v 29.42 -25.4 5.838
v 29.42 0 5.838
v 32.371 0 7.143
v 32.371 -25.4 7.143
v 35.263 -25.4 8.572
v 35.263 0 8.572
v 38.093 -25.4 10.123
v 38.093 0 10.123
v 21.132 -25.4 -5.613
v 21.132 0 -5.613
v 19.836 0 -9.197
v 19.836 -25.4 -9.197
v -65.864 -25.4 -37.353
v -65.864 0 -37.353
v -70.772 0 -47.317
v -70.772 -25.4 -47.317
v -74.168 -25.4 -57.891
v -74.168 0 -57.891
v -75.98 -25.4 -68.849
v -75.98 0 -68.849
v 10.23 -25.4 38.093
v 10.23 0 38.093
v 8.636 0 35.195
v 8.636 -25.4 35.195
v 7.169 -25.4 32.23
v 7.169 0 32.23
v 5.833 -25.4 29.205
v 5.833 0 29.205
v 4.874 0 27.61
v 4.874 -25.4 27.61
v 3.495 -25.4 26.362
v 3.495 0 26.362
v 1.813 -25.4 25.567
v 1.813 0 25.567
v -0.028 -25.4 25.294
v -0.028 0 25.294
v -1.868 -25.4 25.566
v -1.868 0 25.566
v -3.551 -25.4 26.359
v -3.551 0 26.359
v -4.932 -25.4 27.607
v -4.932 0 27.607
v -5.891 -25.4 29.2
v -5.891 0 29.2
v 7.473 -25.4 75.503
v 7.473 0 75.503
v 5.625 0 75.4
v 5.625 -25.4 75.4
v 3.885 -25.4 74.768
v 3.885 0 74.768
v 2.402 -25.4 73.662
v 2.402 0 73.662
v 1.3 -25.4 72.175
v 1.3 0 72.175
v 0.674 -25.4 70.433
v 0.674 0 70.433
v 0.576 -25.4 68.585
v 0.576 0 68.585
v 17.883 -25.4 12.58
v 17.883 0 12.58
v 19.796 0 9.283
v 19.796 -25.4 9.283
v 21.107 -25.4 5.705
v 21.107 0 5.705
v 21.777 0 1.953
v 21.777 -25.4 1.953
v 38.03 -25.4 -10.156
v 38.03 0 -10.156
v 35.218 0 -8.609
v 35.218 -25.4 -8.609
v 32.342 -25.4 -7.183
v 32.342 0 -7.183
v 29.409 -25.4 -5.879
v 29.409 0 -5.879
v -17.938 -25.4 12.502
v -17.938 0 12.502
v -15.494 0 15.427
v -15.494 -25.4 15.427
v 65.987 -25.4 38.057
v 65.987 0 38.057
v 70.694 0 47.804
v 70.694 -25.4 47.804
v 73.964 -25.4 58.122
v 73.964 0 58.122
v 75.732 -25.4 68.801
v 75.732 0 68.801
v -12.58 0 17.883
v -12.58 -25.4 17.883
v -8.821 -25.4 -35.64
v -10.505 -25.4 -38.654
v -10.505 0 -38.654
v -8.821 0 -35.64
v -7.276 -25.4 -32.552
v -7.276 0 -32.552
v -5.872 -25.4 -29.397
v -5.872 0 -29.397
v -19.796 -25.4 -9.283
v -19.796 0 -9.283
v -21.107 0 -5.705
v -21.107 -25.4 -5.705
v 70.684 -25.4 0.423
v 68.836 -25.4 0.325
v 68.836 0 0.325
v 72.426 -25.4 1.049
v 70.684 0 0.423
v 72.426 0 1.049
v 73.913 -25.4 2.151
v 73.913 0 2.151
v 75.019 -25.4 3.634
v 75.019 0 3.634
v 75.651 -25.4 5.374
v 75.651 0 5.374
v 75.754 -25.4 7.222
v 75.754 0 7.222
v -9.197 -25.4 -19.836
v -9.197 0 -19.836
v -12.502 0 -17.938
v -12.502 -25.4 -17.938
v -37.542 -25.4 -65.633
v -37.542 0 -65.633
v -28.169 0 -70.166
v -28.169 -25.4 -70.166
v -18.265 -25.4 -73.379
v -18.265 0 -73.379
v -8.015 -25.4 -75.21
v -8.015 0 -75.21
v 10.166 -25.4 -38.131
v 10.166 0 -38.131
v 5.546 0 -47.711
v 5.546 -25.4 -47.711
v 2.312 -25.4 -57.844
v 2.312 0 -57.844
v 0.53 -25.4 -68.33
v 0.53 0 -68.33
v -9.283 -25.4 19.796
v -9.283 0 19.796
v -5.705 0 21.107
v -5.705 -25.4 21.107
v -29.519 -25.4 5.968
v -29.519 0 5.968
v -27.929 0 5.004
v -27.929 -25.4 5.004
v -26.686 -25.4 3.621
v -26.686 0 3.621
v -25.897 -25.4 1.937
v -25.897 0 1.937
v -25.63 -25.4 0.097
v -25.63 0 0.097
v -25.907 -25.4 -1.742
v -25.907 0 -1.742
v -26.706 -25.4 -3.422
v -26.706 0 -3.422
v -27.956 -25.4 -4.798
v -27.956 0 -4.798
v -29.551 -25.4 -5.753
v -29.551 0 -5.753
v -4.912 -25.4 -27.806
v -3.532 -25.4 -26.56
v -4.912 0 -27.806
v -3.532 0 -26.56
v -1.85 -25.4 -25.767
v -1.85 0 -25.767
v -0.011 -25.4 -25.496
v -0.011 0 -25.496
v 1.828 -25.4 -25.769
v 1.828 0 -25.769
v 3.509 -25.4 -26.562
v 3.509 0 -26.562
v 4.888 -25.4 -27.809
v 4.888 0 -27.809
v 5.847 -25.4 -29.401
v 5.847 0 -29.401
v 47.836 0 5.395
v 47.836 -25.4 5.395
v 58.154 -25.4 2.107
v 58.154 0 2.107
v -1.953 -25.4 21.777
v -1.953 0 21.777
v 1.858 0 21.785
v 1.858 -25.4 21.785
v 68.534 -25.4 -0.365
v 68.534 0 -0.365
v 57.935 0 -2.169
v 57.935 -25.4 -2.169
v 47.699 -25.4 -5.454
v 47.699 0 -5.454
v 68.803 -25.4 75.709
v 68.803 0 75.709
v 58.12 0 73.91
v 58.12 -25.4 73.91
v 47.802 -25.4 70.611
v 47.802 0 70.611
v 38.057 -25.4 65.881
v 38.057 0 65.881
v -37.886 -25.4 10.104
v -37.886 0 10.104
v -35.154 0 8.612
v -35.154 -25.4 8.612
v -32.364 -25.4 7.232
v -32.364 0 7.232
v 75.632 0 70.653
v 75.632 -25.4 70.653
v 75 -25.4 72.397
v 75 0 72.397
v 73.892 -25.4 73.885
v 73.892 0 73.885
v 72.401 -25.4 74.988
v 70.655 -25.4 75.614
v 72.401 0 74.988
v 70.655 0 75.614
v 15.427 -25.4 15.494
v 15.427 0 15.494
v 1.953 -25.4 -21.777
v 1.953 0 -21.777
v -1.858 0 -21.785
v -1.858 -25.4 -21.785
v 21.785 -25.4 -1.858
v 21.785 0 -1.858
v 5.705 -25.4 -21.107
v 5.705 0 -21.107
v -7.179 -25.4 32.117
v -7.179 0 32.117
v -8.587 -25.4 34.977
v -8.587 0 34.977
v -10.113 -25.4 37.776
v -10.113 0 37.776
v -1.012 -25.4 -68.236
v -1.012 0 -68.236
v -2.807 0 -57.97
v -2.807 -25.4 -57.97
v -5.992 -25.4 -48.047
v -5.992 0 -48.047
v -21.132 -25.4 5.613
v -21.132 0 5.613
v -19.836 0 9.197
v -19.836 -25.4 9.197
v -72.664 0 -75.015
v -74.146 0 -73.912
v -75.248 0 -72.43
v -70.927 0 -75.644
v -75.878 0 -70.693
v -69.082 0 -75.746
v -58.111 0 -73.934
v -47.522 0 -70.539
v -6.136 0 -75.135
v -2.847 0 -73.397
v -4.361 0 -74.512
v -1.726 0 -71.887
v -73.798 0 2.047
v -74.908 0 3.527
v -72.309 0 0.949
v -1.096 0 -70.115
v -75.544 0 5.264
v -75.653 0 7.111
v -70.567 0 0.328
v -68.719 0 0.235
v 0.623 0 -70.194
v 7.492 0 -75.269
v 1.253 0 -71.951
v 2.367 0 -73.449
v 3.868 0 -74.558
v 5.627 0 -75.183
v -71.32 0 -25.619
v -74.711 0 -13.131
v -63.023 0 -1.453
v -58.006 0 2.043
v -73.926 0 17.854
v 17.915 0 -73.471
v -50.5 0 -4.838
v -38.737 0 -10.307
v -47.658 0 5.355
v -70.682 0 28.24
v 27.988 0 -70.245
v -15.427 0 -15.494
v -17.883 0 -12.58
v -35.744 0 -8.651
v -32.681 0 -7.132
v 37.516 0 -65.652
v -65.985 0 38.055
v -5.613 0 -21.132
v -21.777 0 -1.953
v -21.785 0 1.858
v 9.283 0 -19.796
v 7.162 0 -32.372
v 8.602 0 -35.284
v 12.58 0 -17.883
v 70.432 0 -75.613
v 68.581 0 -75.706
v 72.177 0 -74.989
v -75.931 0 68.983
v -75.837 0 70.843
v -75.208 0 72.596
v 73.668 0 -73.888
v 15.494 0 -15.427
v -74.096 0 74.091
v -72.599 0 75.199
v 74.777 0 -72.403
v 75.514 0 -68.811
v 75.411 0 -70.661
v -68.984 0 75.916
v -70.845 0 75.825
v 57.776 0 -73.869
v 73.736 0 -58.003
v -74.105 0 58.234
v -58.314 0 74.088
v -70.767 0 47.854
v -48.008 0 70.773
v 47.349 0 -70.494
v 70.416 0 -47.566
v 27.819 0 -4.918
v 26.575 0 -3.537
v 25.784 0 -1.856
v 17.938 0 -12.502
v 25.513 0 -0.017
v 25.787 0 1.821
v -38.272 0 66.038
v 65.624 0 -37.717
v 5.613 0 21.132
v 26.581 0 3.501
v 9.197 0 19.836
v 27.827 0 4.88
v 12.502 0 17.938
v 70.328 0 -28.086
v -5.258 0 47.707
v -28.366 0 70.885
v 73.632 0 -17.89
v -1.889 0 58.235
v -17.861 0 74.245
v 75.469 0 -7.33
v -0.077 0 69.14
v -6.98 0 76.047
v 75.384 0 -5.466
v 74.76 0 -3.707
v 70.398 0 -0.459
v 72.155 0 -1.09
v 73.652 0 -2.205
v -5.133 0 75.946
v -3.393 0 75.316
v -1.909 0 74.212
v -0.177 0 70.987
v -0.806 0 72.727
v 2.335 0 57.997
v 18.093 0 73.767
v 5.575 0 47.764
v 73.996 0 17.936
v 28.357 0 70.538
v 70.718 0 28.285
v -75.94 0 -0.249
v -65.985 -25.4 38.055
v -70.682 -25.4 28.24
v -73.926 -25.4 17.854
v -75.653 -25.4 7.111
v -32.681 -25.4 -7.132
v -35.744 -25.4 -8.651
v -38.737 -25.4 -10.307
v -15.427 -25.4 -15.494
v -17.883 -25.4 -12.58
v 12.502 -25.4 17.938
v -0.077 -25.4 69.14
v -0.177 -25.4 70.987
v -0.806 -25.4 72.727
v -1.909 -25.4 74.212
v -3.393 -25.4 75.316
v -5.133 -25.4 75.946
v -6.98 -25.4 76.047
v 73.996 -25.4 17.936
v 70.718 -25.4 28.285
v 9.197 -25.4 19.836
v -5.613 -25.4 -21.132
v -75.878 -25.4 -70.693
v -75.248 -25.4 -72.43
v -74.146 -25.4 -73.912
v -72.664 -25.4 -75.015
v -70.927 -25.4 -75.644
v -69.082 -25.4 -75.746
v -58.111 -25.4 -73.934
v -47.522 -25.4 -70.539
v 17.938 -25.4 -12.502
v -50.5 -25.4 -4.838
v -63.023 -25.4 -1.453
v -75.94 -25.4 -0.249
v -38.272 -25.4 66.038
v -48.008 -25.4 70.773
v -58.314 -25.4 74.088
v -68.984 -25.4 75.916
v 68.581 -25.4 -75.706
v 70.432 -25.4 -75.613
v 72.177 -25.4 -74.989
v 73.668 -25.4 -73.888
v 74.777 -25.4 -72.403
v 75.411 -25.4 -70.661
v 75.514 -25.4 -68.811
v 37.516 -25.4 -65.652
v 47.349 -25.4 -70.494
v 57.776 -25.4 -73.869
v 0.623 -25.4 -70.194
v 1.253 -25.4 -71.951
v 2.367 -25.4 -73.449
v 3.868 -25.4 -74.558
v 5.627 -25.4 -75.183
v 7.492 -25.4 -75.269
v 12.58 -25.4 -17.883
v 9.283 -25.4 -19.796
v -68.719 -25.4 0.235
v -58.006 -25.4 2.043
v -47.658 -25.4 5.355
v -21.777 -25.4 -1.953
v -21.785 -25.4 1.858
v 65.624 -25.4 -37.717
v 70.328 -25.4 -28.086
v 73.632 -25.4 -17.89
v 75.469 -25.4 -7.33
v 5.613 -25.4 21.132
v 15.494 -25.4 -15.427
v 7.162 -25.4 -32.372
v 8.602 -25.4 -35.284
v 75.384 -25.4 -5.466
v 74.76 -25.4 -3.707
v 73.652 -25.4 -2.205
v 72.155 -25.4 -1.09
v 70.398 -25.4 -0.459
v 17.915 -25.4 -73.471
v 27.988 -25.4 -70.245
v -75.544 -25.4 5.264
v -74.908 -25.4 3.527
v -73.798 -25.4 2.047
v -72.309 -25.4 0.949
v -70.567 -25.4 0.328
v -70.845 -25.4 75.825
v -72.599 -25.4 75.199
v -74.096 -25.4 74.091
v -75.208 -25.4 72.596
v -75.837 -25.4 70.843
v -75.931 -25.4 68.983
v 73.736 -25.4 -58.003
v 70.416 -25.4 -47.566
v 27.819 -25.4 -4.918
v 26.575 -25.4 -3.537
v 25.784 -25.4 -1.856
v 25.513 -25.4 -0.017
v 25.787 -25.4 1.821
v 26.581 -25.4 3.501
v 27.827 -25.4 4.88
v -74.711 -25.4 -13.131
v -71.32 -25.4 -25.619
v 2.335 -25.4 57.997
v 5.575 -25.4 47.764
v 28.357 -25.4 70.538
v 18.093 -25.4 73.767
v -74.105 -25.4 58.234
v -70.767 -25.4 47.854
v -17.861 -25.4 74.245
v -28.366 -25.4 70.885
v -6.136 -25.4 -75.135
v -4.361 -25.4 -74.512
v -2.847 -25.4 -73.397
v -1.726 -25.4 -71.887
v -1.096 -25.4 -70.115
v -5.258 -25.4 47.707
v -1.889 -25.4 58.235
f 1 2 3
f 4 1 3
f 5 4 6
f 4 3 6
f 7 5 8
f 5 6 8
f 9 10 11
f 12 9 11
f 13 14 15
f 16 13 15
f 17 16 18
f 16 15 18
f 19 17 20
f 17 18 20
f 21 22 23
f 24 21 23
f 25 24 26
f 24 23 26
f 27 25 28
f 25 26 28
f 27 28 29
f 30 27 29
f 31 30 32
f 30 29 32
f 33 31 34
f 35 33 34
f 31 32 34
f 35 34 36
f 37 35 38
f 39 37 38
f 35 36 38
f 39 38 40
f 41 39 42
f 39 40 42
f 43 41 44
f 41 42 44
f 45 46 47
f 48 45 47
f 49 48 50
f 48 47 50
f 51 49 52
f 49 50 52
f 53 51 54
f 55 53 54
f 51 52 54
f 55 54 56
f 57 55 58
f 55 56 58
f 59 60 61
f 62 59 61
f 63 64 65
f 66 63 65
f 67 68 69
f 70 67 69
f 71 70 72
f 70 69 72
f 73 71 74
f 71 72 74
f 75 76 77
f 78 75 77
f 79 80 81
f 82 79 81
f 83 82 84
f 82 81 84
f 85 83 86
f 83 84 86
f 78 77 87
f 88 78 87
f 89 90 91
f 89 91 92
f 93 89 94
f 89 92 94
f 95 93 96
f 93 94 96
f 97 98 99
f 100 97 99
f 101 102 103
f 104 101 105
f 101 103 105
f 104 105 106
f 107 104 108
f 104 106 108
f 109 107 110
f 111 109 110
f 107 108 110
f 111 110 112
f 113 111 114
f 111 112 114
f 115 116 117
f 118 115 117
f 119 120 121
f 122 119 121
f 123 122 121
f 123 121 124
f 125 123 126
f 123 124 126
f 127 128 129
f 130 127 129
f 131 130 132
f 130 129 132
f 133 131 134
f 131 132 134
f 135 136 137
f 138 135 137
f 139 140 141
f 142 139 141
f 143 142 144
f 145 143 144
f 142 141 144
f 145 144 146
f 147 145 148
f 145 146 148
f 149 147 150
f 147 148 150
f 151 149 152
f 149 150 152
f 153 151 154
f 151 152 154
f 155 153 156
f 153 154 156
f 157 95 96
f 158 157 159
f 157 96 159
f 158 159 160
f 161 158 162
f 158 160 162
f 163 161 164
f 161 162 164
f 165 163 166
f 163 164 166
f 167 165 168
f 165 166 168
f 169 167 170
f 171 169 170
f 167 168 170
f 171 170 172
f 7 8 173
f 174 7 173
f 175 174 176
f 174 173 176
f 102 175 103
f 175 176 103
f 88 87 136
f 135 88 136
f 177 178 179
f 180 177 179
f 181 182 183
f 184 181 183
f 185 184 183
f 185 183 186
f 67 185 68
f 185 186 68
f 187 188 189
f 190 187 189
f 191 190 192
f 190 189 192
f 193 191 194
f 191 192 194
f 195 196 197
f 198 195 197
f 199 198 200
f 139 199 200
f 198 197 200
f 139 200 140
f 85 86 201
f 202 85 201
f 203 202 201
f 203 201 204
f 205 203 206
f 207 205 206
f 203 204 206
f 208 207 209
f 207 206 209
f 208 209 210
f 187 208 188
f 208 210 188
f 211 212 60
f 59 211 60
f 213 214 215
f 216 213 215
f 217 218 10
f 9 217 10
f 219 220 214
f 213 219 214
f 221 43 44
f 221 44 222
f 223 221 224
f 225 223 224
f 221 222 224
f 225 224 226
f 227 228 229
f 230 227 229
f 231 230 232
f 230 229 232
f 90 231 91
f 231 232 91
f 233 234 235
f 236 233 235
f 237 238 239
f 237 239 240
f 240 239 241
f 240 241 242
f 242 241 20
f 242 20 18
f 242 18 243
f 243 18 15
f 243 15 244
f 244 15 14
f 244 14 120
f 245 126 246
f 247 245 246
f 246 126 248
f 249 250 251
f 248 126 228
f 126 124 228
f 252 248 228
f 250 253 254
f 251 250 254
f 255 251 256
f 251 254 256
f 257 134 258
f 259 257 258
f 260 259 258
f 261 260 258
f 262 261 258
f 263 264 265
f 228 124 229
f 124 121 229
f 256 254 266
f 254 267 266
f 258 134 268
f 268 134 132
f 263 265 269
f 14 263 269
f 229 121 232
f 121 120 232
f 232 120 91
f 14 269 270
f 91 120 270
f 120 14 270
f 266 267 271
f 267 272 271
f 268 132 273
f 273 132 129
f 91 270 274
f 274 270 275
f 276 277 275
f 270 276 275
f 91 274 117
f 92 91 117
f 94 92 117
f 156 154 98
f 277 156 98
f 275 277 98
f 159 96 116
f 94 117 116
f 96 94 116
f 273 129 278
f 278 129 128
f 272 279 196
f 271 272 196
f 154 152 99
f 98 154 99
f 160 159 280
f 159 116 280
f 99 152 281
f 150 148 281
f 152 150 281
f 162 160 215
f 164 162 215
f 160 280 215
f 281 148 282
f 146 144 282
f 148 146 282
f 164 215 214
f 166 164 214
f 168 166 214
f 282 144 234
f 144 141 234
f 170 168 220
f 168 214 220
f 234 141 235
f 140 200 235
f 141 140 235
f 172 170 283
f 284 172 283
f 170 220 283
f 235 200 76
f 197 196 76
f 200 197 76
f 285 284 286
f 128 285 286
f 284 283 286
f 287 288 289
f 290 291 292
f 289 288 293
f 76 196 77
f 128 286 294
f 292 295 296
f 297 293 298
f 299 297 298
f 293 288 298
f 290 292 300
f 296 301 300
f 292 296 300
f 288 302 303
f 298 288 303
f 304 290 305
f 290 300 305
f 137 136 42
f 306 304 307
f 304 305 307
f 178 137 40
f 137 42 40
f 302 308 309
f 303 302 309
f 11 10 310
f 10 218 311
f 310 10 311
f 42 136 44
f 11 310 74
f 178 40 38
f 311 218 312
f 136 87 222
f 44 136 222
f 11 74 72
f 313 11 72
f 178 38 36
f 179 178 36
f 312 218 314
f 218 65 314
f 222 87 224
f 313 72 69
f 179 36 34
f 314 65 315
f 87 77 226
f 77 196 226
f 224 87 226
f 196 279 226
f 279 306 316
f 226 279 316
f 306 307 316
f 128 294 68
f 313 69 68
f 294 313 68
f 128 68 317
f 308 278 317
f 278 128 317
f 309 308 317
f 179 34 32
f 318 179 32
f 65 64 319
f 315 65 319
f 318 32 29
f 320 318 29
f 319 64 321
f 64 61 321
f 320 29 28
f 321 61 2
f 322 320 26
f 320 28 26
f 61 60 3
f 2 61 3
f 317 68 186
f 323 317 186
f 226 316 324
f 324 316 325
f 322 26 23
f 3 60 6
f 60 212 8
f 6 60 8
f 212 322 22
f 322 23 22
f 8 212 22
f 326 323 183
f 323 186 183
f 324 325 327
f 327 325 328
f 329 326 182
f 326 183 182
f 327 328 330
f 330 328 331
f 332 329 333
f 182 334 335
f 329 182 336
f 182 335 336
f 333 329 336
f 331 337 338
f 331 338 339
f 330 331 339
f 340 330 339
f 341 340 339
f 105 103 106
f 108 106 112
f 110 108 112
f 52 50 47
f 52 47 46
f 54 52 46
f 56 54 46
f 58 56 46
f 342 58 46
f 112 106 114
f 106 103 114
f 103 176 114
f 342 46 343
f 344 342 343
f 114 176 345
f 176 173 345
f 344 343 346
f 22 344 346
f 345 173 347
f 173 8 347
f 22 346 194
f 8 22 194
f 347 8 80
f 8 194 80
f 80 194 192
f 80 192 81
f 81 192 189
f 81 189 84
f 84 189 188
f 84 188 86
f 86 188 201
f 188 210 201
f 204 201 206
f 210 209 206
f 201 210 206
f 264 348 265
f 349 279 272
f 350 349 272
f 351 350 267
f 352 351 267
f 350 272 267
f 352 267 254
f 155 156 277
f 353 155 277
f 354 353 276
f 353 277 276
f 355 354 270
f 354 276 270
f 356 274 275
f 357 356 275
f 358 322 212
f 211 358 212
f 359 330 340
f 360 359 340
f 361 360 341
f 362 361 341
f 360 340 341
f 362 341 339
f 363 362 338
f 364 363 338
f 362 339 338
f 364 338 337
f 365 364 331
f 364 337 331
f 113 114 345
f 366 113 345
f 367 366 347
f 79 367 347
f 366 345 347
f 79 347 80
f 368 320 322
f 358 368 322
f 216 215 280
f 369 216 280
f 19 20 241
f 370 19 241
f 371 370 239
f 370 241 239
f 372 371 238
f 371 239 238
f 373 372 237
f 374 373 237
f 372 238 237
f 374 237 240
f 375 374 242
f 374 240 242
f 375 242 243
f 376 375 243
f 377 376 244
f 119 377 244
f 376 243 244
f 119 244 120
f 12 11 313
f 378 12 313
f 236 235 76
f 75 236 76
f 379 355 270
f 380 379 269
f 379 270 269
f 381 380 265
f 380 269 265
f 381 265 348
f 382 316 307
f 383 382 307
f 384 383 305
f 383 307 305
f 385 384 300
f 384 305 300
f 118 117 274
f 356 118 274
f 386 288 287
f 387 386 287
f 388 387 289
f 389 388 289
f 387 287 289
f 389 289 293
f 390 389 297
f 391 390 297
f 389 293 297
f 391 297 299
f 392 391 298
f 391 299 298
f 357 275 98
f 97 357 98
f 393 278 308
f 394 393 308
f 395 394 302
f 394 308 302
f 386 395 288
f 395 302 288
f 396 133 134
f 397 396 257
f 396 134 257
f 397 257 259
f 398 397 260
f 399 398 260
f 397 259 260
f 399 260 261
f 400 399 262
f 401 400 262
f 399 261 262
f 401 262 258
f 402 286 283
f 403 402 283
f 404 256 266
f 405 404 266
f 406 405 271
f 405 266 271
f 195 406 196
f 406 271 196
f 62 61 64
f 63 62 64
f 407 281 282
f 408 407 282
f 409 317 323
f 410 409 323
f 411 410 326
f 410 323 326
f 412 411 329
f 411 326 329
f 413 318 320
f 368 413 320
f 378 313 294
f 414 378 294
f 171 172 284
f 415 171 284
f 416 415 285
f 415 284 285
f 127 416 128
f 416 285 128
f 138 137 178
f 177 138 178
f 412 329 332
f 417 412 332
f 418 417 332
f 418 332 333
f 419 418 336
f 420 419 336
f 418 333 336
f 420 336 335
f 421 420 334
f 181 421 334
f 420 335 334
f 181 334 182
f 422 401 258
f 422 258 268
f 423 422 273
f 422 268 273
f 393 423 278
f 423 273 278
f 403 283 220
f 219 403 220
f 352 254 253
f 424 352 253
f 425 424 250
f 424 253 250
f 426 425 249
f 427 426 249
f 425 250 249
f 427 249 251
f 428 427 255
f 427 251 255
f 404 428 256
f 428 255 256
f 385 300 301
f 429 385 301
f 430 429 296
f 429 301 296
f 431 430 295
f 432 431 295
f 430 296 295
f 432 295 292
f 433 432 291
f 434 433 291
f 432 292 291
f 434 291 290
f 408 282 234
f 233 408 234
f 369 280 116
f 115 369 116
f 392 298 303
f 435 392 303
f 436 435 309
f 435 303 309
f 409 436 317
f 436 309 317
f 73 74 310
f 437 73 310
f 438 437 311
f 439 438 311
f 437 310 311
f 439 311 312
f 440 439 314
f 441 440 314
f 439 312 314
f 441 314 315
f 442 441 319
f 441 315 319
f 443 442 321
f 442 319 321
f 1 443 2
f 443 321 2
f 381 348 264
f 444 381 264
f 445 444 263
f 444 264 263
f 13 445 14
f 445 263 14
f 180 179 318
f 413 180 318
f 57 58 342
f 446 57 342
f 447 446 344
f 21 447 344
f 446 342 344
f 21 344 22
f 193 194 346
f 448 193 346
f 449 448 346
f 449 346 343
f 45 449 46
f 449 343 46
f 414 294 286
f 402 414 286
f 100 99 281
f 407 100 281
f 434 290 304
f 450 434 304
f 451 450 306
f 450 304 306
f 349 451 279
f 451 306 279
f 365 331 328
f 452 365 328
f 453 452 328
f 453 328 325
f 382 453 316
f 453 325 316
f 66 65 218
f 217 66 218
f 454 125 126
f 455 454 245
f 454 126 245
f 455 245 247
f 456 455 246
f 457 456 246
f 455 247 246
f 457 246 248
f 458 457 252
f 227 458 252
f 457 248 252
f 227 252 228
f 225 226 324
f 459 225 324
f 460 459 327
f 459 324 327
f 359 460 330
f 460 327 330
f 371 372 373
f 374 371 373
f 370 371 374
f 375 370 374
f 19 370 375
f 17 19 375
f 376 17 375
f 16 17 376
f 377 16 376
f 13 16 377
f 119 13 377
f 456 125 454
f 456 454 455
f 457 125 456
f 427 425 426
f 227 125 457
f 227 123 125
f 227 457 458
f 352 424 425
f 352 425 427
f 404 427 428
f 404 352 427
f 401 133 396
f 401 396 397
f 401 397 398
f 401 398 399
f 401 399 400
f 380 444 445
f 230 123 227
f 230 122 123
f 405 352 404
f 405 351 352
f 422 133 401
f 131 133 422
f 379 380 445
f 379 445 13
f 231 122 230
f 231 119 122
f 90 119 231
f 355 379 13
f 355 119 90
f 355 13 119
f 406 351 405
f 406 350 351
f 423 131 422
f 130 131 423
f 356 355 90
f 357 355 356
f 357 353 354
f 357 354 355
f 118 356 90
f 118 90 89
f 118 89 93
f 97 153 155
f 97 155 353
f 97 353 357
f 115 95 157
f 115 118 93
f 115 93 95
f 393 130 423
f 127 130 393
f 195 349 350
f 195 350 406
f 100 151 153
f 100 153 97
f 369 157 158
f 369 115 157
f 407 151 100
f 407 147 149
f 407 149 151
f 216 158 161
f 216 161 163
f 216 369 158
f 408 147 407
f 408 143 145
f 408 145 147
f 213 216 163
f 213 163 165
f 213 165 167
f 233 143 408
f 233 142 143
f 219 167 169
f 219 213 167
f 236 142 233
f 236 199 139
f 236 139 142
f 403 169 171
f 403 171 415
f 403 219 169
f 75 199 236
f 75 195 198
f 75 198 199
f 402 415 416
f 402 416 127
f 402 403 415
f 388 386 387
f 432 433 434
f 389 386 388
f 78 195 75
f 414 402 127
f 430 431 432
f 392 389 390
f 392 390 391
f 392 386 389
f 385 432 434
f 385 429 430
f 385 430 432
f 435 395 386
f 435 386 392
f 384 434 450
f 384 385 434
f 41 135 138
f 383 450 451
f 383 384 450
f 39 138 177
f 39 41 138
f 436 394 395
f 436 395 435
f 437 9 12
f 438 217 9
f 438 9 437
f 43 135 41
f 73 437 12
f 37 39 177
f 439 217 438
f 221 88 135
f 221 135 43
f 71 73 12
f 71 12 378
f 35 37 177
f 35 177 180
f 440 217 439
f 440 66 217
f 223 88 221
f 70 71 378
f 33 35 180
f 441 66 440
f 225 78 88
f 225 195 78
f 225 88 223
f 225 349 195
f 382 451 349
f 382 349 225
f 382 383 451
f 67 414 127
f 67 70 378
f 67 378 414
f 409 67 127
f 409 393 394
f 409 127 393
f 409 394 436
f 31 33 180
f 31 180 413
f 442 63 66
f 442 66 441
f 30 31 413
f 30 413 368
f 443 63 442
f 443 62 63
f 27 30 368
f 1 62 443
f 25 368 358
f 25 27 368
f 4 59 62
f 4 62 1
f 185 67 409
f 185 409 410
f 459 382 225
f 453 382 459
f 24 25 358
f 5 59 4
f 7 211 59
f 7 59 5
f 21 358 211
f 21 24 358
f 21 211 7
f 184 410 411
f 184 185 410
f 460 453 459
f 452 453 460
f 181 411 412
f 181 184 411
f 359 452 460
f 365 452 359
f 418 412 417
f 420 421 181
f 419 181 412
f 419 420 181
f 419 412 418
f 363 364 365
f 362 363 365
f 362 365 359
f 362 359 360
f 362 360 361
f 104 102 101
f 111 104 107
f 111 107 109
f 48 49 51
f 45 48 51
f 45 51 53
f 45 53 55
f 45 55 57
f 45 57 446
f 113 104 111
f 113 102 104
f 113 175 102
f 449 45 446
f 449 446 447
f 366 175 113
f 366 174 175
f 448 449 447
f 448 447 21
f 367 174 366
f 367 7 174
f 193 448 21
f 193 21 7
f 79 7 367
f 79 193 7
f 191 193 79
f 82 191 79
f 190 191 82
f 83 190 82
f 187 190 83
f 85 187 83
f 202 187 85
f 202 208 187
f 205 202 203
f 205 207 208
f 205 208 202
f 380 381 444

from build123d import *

# Parameters (mm, degrees)
F1_DEPTH = 25.4


with BuildPart() as f1:
    # F0 (on Front) → F1 (new body)
    with BuildSketch(Plane.XZ):
        with BuildLine():
            ThreePointArc((-5.8723054883, -29.3974713107), (-0.0113045982, -25.4959433684), (5.8471949357, -29.4012263195))
            ThreePointArc((5.8471949357, -29.4012263195), (7.8665830511, -33.8356885101), (10.1664885318, -38.131362853))
            ThreePointArc((10.1664885318, -38.131362853), (22.2433688947, -22.2960530681), (38.0304113332, -10.1561450647))
            ThreePointArc((38.0304113332, -10.1561450647), (33.7877497726, -7.8805671775), (29.4089474828, -5.8794369107))
            ThreePointArc((29.4089474828, -5.8794369107), (25.5132673299, -0.0171496036), (29.4195896796, 5.8380516761))
            ThreePointArc((29.4195896796, 5.8380516761), (33.8245563846, 7.8420080033), (38.0926920423, 10.1229268184))
            ThreePointArc((38.0926920423, 10.1229268184), (22.3048159694, 22.2586636554), (10.2296361263, 38.0929041244))
            ThreePointArc((10.2296361263, 38.0929041244), (7.8862120567, 33.7206748888), (5.832770092, 29.2049910031))
            ThreePointArc((5.832770092, 29.2049910031), (-0.0278322356, 25.2936581115), (-5.8914533675, 29.2004639491))
            ThreePointArc((-5.8914533675, 29.2004639491), (-7.8681260767, 33.5542655176), (-10.1128070971, 37.7761407186))
            ThreePointArc((-10.1128070971, 37.7761407186), (-22.1909246105, 22.1248469042), (-37.8860679576, 10.1037655868))
            ThreePointArc((-37.8860679576, 10.1037655868), (-33.7659122536, 7.9077693057), (-29.519257568, 5.9676644959))
            ThreePointArc((-29.519257568, 5.9676644959), (-25.6301816612, 0.0965438971), (-29.5513078142, -5.7532200459))
            ThreePointArc((-29.5513078142, -5.7532200459), (-34.2211473212, -7.8745098641), (-38.736597903, -10.3071992315))
            ThreePointArc((-38.736597903, -10.3071992315), (-22.7195783494, -22.5870715801), (-10.5053141935, -38.6541787064))
            ThreePointArc((-10.5053141935, -38.6541787064), (-8.0309058523, -34.1048564095), (-5.8723054883, -29.3974713107))
        make_face()
        Polygon((15.4941124372, -15.4270198163), (12.5798481763, -17.8831731103), (9.2833515942, -19.7959552386), (5.7047850715, -21.1072472842), (1.9528815413, -21.7772063019), (-1.8583593065, -21.7854759259), (-5.613134847, -21.1318048879), (-9.1973581256, -19.8360546515), (-12.5021243317, -17.9375959321), (-15.4270198163, -15.4941124372), (-17.8831731103, -12.5798481763), (-19.7959552386, -9.2833515942), (-21.1072472842, -5.7047850715), (-21.7772063019, -1.9528815413), (-21.7854759259, 1.8583593065), (-21.1318048879, 5.613134847), (-19.8360546515, 9.1973581256), (-17.9375959321, 12.5021243317), (-15.4941124372, 15.4270198163), (-12.5798481763, 17.8831731103), (-9.2833515942, 19.7959552386), (-5.7047850715, 21.1072472842), (-1.9528815413, 21.7772063019), (1.8583593065, 21.7854759259), (5.613134847, 21.1318048879), (9.1973581256, 19.8360546515), (12.5021243317, 17.9375959321), (15.4270198163, 15.4941124372), (17.8831731103, 12.5798481763), (19.7959552386, 9.2833515942), (21.1072472842, 5.7047850715), (21.7772063019, 1.9528815413), (21.7854759259, -1.8583593065), (21.1318048879, -5.613134847), (19.8360546515, -9.1973581256), (17.9375959321, -12.5021243317), align=None, mode=Mode.SUBTRACT)
        with BuildLine():
            ThreePointArc((38.0304113332, -10.1561450647), (22.2433688947, -22.2960530681), (10.1664885318, -38.131362853))
            ThreePointArc((10.1664885318, -38.131362853), (22.0522532258, -53.6697738876), (37.5164127114, -65.6519853381))
            ThreePointArc((37.5164127114, -65.6519853381), (53.4213887804, -53.5472360443), (65.6235914885, -37.7169022421))
            ThreePointArc((65.6235914885, -37.7169022421), (53.6333778688, -22.1280221412), (38.0304113332, -10.1561450647))
        make_face()
        with BuildLine():
            ThreePointArc((37.5164127114, -65.6519853381), (22.0522532258, -53.6697738876), (10.1664885318, -38.131362853))
            ThreePointArc((10.1664885318, -38.131362853), (3.7508996959, -52.7209861968), (0.5304546679, -68.3301381035))
            ThreePointArc((0.5304546679, -68.3301381035), (2.3669091486, -73.4489662261), (7.4915009075, -75.2692754617))
            ThreePointArc((7.4915009075, -75.2692754617), (23.0077646864, -72.0335045543), (37.5164127114, -65.6519853381))
        make_face()
        with BuildLine():
            ThreePointArc((65.6235914885, -37.7169022421), (53.4213887804, -53.5472360443), (37.5164127114, -65.6519853381))
            ThreePointArc((37.5164127114, -65.6519853381), (52.5012422767, -72.3700363612), (68.5807077231, -75.7059196936))
            ThreePointArc((68.5807077231, -75.7059196936), (73.6678671005, -73.8876561642), (75.5140176195, -68.8105505857))
            ThreePointArc((75.5140176195, -68.8105505857), (72.2649671763, -52.7242023626), (65.6235914885, -37.7169022421))
        make_face()
        with BuildLine():
            ThreePointArc((68.5341561345, -0.3654146815), (52.7586923315, -3.6294921253), (38.0304113332, -10.1561450647))
            ThreePointArc((38.0304113332, -10.1561450647), (53.6333778688, -22.1280221412), (65.6235914885, -37.7169022421))
            ThreePointArc((65.6235914885, -37.7169022421), (72.1596460359, -23.0463732384), (75.4693013087, -7.3304382592))
            ThreePointArc((75.4693013087, -7.3304382592), (73.6519305037, -2.2048036873), (68.5341561345, -0.3654146815))
        make_face()
        with BuildLine():
            ThreePointArc((-1.0124612587, -68.2357638288), (-4.2291126973, -52.9540601379), (-10.5053141935, -38.6541787064))
            ThreePointArc((-10.5053141935, -38.6541787064), (-22.2999024948, -53.8714051532), (-37.5422616312, -65.6334960339))
            ThreePointArc((-37.5422616312, -65.6334960339), (-23.2716891442, -71.9418906098), (-8.0151108309, -75.2102081286))
            ThreePointArc((-8.0151108309, -75.2102081286), (-2.846828708, -73.396684639), (-1.0124612587, -68.2357638288))
        make_face()
        with BuildLine():
            ThreePointArc((-37.5422616312, -65.6334960339), (-22.2999024948, -53.8714051532), (-10.5053141935, -38.6541787064))
            ThreePointArc((-10.5053141935, -38.6541787064), (-22.7195783494, -22.5870715801), (-38.736597903, -10.3071992315))
            ThreePointArc((-38.736597903, -10.3071992315), (-54.0397274181, -22.0854974937), (-65.8642633829, -37.35292793))
            ThreePointArc((-65.8642633829, -37.35292793), (-53.5939421159, -53.3866616113), (-37.5422616312, -65.6334960339))
        make_face()
        with BuildLine():
            ThreePointArc((-69.0824706786, -75.7464577386), (-52.7543029668, -72.4304590644), (-37.5422616312, -65.6334960339))
            ThreePointArc((-37.5422616312, -65.6334960339), (-53.5939421159, -53.3866616113), (-65.8642633829, -37.35292793))
            ThreePointArc((-65.8642633829, -37.35292793), (-72.6638709017, -52.5414311261), (-75.9800079654, -68.8487462552))
            ThreePointArc((-75.9800079654, -68.8487462552), (-74.1461583123, -73.9124802036), (-69.0824706786, -75.7464577386))
        make_face()
        with BuildLine():
            ThreePointArc((-65.8642633829, -37.35292793), (-54.0397274181, -22.0854974937), (-38.736597903, -10.3071992315))
            ThreePointArc((-38.736597903, -10.3071992315), (-56.6892276099, -2.8775463892), (-75.9399100658, -0.249261829))
            ThreePointArc((-75.9399100658, -0.249261829), (-73.2815706098, -19.4472531015), (-65.8642633829, -37.35292793))
        make_face()
        with BuildLine():
            ThreePointArc((10.2296361263, 38.0929041244), (22.3048159694, 22.2586636554), (38.0926920423, 10.1229268184))
            ThreePointArc((38.0926920423, 10.1229268184), (53.8901327799, 22.2426205771), (65.98720102, 38.0573937547))
            ThreePointArc((65.98720102, 38.0573937547), (53.8722995346, 53.8263794302), (38.0568216949, 65.8805242749))
            ThreePointArc((38.0568216949, 65.8805242749), (22.3163343559, 53.8162099791), (10.2296361263, 38.0929041244))
        make_face()
        with BuildLine():
            ThreePointArc((65.98720102, 38.0573937547), (53.8901327799, 22.2426205771), (38.0926920423, 10.1229268184))
            ThreePointArc((38.0926920423, 10.1229268184), (52.9360390158, 3.5663420182), (68.8360344261, 0.3253700086))
            ThreePointArc((68.8360344261, 0.3253700086), (73.9131252899, 2.1506004529), (75.7537769417, 7.2221208671))
            ThreePointArc((75.7537769417, 7.2221208671), (72.5431064158, 23.169531937), (65.98720102, 38.0573937547))
        make_face()
        with BuildLine():
            ThreePointArc((38.0568216949, 65.8805242749), (53.8722995346, 53.8263794302), (65.98720102, 38.0573937547))
            ThreePointArc((65.98720102, 38.0573937547), (72.5131078913, 52.9048408511), (75.7315907831, 68.8006111581))
            ThreePointArc((75.7315907831, 68.8006111581), (73.892228478, 73.884618477), (68.8027604139, 75.7088166387))
            ThreePointArc((68.8027604139, 75.7088166387), (52.9024303983, 72.4444177186), (38.0568216949, 65.8805242749))
        make_face()
        with BuildLine():
            ThreePointArc((0.5764462826, 68.5849581522), (3.7735517842, 52.8230665558), (10.2296361263, 38.0929041244))
            ThreePointArc((10.2296361263, 38.0929041244), (22.3163343559, 53.8162099791), (38.0568216949, 65.8805242749))
            ThreePointArc((38.0568216949, 65.8805242749), (23.2822699561, 72.3357001965), (7.473197141, 75.5027006678))
            ThreePointArc((7.473197141, 75.5027006678), (2.4016767268, 73.662049016), (0.5764462826, 68.5849581522))
        make_face()
        with BuildLine():
            ThreePointArc((-68.7189010029, 0.2348885395), (-52.7728201927, 3.5145237384), (-37.8860679576, 10.1037655868))
            ThreePointArc((-37.8860679576, 10.1037655868), (-53.780428185, 22.2248734645), (-65.9847602554, 38.0554205788))
            ThreePointArc((-65.9847602554, 38.0554205788), (-72.4904161681, 23.1055098819), (-75.6526730835, 7.1110258359))
            ThreePointArc((-75.6526730835, 7.1110258359), (-73.79835158, 2.0468763691), (-68.7189010029, 0.2348885395))
        make_face()
        with BuildLine():
            ThreePointArc((-65.9847602554, 38.0554205788), (-53.780428185, 22.2248734645), (-37.8860679576, 10.1037655868))
            ThreePointArc((-37.8860679576, 10.1037655868), (-22.1909246105, 22.1248469042), (-10.1128070971, 37.7761407186))
            ThreePointArc((-10.1128070971, 37.7761407186), (-22.3186885042, 53.7740285117), (-38.2722920555, 66.0377346602))
            ThreePointArc((-38.2722920555, 66.0377346602), (-53.9753237868, 53.8755657611), (-65.9847602554, 38.0554205788))
        make_face()
        with BuildLine():
            ThreePointArc((-75.9311179626, 68.9827924054), (-72.6216588957, 52.9840480262), (-65.9847602554, 38.0554205788))
            ThreePointArc((-65.9847602554, 38.0554205788), (-53.9753237868, 53.8755657611), (-38.2722920555, 66.0377346602))
            ThreePointArc((-38.2722920555, 66.0377346602), (-53.1019338593, 72.6132353792), (-68.9843197188, 75.9155535265))
            ThreePointArc((-68.9843197188, 75.9155535265), (-74.0964323111, 74.0912044249), (-75.9311179626, 68.9827924054))
        make_face()
        with BuildLine():
            ThreePointArc((-38.2722920555, 66.0377346602), (-22.3186885042, 53.7740285117), (-10.1128070971, 37.7761407186))
            ThreePointArc((-10.1128070971, 37.7761407186), (-3.3821811813, 52.9097624233), (-0.077326994, 69.1395427644))
            ThreePointArc((-0.077326994, 69.1395427644), (-1.9087320963, 74.2120247418), (-6.9799378863, 76.0469606796))
            ThreePointArc((-6.9799378863, 76.0469606796), (-23.1742648581, 72.7560566396), (-38.2722920555, 66.0377346602))
        make_face()
    extrude(amount=F1_DEPTH)


solid = f1.part
